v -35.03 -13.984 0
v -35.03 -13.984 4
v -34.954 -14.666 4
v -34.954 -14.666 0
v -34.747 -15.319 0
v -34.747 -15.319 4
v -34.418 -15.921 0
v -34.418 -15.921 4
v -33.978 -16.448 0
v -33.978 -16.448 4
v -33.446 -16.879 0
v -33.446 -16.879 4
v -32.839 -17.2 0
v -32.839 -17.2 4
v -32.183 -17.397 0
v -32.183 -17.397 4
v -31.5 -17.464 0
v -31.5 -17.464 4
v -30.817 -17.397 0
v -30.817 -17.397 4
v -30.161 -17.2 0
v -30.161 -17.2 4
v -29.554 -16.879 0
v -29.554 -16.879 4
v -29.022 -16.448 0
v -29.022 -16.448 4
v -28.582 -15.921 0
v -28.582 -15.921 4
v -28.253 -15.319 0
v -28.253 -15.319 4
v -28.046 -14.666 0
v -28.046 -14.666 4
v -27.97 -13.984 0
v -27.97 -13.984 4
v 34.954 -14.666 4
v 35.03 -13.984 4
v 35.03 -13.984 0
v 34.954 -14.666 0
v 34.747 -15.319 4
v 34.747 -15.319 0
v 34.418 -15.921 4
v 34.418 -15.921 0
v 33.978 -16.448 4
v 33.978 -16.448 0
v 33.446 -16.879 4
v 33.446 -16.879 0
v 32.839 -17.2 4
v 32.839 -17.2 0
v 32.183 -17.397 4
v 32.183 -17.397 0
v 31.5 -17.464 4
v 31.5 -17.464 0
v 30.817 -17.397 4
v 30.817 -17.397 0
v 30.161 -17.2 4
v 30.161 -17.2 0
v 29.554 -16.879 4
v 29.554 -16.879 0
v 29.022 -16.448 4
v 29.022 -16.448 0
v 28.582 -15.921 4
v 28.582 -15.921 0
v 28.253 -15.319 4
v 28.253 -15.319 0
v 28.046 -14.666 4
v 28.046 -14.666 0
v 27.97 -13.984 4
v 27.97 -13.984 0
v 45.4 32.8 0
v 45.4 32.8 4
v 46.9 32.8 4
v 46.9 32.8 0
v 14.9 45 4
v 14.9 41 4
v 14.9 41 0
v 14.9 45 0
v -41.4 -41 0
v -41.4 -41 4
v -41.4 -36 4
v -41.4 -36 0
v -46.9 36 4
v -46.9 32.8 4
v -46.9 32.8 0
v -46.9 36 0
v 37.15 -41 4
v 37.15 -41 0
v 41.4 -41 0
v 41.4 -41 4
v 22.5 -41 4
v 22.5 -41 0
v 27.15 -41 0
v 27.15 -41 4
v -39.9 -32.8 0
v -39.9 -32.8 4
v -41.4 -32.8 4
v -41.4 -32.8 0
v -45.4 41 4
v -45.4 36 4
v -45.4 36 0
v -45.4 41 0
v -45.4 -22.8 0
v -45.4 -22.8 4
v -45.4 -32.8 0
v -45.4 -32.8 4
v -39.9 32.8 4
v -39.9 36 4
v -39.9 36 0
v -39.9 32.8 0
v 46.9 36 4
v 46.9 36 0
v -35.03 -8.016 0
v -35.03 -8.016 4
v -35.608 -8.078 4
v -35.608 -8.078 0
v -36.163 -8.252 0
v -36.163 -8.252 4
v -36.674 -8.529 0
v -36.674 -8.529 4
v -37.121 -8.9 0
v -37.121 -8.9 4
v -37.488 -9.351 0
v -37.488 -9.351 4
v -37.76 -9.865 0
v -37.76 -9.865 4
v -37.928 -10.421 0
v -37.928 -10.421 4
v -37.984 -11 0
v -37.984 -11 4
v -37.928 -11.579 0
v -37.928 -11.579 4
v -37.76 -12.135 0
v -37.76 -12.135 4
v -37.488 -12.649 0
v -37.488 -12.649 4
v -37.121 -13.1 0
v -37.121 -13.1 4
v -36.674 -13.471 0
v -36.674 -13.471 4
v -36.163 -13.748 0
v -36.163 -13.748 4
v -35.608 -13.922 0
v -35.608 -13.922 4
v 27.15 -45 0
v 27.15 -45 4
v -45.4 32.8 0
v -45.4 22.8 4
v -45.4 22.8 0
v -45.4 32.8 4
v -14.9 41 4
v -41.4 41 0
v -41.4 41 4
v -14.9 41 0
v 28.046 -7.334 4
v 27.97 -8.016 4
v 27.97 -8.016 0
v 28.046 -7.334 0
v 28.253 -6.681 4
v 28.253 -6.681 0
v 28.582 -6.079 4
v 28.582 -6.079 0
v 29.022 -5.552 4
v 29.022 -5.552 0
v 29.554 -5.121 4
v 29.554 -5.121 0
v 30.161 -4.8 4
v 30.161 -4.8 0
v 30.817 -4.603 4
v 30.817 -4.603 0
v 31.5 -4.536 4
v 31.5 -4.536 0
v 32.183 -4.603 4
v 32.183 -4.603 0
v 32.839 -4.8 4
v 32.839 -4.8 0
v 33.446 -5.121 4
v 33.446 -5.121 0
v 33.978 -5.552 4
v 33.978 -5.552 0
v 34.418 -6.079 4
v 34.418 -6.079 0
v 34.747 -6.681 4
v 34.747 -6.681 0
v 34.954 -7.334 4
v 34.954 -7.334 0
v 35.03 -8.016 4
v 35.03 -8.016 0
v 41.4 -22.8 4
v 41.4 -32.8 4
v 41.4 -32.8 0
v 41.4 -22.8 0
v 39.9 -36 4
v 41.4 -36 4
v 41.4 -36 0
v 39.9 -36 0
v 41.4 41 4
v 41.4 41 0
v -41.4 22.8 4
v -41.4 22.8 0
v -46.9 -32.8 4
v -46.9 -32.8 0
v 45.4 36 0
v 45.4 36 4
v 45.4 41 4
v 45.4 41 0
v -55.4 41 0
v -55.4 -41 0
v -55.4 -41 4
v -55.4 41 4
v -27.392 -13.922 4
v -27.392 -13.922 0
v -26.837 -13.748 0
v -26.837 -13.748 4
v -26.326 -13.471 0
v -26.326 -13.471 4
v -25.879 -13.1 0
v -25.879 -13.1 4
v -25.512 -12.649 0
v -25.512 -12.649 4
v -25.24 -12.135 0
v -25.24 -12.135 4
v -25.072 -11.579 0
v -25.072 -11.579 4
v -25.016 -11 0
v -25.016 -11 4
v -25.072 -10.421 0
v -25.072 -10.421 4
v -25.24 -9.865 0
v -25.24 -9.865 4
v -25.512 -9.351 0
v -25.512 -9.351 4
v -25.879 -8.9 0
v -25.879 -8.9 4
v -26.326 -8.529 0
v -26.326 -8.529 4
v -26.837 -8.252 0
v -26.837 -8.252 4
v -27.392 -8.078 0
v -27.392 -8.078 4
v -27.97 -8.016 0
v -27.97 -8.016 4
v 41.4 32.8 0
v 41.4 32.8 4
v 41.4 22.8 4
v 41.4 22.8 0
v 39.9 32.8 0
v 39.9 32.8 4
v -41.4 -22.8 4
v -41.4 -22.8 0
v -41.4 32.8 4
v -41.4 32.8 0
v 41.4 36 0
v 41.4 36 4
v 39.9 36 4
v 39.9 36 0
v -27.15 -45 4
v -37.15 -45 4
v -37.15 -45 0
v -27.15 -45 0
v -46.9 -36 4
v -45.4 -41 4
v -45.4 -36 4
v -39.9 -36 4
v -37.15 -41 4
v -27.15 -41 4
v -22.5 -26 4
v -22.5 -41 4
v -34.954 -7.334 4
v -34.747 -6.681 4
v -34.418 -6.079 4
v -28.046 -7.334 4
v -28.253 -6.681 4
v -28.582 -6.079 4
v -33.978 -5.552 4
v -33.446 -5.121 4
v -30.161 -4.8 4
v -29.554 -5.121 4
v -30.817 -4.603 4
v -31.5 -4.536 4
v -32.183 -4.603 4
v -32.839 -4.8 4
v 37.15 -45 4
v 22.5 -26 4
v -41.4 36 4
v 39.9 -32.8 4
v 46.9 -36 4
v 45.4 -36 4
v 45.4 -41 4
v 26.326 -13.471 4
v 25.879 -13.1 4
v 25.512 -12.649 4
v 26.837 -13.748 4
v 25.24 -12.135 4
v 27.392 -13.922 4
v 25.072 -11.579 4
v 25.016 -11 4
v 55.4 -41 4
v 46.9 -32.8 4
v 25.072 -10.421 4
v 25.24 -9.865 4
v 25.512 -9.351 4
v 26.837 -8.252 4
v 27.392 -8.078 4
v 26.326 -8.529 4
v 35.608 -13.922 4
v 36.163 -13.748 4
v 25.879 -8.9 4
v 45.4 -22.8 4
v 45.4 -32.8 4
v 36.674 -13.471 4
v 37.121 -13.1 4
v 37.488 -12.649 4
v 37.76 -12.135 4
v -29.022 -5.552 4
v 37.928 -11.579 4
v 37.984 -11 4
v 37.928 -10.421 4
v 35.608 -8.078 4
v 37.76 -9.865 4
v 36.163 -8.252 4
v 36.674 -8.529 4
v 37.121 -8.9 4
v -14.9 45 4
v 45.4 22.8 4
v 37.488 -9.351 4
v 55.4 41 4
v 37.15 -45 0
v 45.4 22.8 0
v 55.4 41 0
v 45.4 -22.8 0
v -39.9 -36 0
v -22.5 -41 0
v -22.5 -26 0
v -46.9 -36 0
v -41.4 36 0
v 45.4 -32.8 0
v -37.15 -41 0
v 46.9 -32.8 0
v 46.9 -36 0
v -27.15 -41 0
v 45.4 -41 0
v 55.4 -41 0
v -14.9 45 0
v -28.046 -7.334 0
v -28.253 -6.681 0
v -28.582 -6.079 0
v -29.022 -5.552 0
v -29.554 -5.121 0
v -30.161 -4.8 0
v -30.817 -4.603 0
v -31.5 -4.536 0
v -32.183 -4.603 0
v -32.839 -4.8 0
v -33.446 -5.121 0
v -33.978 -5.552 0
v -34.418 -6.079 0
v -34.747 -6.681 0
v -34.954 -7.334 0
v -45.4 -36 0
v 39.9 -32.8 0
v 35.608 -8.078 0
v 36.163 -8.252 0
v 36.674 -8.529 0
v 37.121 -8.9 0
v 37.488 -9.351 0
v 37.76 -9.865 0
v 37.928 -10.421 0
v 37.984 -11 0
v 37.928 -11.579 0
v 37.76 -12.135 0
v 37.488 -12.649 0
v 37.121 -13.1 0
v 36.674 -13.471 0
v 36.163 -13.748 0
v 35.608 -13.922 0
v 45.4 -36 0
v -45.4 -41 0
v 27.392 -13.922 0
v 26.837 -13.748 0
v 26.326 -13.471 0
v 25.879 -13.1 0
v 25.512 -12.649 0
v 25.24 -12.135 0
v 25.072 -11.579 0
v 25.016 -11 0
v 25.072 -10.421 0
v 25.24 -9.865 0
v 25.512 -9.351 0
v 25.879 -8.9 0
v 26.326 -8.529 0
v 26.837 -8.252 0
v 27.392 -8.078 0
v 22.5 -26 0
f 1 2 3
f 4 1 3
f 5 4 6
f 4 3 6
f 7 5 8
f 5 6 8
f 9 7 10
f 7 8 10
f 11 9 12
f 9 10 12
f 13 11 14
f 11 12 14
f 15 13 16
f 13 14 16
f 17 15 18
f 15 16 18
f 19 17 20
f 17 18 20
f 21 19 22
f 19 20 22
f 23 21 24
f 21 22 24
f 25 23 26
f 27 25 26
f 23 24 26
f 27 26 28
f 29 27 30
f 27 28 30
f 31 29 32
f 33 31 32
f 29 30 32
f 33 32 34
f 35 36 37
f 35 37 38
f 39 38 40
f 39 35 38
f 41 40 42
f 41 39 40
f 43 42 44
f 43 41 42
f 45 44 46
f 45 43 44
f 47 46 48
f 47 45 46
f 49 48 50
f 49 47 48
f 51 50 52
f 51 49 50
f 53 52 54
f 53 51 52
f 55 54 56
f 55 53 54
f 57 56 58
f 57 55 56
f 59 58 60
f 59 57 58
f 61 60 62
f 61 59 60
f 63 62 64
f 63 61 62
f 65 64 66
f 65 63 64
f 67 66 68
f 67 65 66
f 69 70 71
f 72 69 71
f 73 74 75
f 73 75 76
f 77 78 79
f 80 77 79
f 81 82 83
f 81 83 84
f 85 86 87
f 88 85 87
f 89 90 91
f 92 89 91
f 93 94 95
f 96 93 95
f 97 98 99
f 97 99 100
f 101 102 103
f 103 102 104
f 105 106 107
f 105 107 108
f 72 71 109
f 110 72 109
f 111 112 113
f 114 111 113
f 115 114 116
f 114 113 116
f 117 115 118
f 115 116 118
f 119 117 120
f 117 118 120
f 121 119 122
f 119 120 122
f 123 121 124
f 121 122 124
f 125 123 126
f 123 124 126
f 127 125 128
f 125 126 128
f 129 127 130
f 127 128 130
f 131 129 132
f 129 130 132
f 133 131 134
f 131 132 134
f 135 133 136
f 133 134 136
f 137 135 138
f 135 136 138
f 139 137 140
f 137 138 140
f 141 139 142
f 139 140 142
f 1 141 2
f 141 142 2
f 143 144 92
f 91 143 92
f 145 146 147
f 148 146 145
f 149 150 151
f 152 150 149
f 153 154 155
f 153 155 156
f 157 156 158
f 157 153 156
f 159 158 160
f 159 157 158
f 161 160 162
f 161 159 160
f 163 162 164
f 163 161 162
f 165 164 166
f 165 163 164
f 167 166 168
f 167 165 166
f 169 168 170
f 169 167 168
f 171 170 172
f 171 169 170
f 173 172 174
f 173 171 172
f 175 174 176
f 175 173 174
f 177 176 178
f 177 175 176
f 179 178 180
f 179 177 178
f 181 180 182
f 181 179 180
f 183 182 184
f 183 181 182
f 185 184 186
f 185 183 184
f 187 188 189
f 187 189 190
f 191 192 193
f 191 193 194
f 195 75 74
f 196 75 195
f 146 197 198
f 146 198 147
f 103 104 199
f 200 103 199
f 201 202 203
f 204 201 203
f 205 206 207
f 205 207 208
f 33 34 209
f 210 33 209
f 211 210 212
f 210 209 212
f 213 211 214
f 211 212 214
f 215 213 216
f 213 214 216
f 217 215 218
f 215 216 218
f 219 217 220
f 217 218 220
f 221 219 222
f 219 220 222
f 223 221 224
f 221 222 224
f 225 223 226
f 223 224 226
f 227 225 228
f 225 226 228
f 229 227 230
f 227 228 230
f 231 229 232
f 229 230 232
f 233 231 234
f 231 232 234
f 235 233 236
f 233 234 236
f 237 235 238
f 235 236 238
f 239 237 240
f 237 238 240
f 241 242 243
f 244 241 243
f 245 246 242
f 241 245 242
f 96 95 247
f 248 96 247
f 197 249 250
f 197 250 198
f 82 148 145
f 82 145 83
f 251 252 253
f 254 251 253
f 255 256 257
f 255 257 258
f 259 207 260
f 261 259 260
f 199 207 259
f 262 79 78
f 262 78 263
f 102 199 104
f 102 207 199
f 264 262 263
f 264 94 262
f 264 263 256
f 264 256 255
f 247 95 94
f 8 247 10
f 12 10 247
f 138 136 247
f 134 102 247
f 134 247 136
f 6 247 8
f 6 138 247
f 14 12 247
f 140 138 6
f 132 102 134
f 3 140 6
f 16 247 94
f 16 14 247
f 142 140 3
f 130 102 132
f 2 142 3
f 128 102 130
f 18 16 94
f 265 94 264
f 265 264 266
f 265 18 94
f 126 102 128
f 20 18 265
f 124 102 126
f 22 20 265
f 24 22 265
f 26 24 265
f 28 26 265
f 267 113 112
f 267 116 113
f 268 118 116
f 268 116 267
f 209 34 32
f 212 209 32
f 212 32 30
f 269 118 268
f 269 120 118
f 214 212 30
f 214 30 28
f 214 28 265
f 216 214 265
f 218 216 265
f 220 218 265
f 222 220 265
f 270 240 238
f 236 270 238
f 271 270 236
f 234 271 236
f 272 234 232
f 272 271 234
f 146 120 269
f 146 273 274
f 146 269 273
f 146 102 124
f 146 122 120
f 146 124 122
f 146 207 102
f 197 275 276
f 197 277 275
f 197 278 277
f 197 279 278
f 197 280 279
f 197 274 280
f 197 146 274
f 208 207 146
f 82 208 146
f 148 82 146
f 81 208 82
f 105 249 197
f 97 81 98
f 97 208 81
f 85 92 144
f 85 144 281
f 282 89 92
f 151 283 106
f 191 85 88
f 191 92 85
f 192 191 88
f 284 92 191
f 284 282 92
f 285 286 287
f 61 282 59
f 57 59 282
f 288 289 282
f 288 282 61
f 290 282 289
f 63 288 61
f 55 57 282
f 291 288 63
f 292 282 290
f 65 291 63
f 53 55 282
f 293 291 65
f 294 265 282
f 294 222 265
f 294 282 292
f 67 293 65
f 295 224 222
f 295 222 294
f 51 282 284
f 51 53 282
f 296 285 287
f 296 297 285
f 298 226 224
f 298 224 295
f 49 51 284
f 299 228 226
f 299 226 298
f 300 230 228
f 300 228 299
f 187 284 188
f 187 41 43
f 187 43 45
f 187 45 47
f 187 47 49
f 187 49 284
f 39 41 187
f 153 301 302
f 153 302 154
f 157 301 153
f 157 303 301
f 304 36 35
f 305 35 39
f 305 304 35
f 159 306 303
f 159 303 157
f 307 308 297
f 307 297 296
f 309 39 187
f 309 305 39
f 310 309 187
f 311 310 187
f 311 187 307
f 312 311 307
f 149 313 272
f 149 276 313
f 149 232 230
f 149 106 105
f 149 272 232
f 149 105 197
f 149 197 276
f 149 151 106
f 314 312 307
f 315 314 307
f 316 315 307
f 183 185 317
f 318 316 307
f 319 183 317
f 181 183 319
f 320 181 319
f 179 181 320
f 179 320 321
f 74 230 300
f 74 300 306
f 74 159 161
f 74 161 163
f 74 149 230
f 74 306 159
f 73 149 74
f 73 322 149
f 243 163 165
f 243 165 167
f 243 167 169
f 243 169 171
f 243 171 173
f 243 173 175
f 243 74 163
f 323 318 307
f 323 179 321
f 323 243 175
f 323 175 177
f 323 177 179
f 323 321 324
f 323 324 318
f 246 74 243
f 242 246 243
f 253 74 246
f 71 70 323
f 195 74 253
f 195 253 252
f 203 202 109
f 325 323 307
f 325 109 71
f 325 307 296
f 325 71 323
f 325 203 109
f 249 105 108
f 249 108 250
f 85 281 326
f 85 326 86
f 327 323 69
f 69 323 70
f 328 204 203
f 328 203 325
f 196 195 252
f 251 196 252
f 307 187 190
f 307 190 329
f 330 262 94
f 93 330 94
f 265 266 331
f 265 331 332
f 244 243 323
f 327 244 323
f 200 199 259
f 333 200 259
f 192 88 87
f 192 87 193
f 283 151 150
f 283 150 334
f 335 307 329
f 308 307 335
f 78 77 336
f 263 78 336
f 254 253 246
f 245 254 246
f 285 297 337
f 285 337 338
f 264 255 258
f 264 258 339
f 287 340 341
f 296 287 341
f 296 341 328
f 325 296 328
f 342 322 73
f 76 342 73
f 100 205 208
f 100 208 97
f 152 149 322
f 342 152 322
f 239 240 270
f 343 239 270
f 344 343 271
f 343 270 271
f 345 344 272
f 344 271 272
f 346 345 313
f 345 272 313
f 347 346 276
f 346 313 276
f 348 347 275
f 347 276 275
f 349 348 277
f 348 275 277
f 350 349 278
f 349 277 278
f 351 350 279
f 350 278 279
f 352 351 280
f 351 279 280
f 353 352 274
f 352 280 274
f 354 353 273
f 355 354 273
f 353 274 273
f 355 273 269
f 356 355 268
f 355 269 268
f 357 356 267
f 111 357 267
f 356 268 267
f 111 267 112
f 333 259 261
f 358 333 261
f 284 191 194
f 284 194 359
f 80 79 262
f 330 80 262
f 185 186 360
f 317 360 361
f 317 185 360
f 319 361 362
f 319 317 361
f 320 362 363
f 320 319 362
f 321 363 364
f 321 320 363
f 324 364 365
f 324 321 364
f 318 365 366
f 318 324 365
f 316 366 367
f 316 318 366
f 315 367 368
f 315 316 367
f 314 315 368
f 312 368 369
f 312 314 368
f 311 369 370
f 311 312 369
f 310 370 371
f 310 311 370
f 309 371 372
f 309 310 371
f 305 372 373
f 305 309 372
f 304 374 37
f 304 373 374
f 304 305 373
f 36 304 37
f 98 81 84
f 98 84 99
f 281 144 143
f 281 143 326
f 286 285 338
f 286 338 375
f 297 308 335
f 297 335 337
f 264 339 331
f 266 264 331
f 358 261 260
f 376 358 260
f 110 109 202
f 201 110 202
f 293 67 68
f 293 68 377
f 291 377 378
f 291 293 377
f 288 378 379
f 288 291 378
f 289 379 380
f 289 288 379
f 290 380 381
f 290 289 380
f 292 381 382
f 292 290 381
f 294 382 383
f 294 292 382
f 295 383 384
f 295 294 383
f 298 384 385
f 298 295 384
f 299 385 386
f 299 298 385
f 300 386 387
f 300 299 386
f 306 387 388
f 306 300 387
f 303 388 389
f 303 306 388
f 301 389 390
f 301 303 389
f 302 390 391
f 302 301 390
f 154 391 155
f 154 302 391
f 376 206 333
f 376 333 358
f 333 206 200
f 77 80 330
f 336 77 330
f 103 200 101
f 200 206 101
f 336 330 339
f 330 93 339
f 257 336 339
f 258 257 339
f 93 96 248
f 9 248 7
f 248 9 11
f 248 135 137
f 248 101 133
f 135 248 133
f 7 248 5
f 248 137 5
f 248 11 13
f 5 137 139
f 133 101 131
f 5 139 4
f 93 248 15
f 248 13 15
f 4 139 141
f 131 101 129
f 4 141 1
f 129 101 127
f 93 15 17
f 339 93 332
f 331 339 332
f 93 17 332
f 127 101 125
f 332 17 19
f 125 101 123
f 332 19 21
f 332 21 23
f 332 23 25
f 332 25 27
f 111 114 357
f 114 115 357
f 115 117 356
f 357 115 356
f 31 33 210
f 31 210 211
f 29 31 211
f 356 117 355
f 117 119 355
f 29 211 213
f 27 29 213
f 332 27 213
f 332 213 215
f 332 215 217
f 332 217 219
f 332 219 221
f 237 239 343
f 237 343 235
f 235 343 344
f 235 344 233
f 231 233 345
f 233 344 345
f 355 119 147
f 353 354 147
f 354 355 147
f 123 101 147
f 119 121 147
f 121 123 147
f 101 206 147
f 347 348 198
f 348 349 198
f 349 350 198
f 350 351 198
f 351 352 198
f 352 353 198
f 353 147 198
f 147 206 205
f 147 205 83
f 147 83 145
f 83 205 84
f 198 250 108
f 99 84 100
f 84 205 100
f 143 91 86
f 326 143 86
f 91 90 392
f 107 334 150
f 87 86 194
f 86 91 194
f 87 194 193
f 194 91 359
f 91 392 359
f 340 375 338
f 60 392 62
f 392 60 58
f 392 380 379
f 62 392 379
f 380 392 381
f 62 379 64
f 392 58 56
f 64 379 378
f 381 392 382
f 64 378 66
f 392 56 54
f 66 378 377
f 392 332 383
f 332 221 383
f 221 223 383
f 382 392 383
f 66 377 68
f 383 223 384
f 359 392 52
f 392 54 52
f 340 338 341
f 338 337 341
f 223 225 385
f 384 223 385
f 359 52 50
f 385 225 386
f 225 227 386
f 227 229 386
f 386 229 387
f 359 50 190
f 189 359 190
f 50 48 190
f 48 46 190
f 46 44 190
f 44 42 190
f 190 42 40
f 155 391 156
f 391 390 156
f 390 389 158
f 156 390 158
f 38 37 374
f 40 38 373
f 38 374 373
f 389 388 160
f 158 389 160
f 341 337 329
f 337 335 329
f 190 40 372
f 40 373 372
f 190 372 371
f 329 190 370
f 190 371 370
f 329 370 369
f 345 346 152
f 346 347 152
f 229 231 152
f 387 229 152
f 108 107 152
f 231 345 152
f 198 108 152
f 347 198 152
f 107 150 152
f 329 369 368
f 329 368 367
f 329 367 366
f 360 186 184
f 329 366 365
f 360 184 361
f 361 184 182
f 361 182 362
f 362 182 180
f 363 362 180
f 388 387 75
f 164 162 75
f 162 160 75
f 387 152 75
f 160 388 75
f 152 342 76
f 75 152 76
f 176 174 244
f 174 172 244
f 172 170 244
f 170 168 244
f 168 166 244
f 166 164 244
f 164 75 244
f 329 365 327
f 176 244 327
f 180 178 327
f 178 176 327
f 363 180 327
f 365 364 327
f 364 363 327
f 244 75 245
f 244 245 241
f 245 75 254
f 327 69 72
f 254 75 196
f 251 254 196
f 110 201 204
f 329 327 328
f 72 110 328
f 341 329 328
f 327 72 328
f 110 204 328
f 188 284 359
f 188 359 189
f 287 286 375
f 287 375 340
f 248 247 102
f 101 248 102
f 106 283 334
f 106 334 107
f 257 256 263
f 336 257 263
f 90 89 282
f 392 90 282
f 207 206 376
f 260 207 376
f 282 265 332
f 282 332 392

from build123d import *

# Parameters (mm, degrees)
SKETCH1_W           = 110.8
SKETCH1_H           = 82
BOSS_EXTRUDE1_DEPTH = 4
CUT_EXTRUDE1_DEPTH  = 10
SKETCH3_W           = 45
SKETCH3_H           = 15
CUT_EXTRUDE2_DEPTH  = 10
CUT_EXTRUDE3_DEPTH  = 10
SKETCH8_W           = 29.8
SKETCH8_H           = 4
BOSS_EXTRUDE2_DEPTH = 4
SKETCH9_W           = 10
SKETCH9_H           = 4
BOSS_EXTRUDE3_DEPTH = 4


with BuildPart() as part:
    # Sketch1 → Boss-Extrude1 (new body)
    with BuildSketch(Plane.XY):
        Rectangle(SKETCH1_W, SKETCH1_H)
    extrude(amount=BOSS_EXTRUDE1_DEPTH)

    # Sketch2 → Cut-Extrude1 (cut)
    with BuildSketch(Plane.XY.offset(4)):
        Polygon((41.4, -32.8), (41.4, -22.8), (45.4, -22.8), (45.4, -32.8), (46.9, -32.8), (46.9, -36), (45.4, -36), (45.4, -41), (41.4, -41), (41.4, -36), (39.9, -36), (39.9, -32.8), align=None)
        Polygon((-41.4, 32.8), (-41.4, 22.8), (-45.4, 22.8), (-45.4, 32.8), (-46.9, 32.8), (-46.9, 36), (-45.4, 36), (-45.4, 41), (-41.4, 41), (-41.4, 36), (-39.9, 36), (-39.9, 32.8), align=None)
        Polygon((45.4, 22.8), (45.4, 32.8), (46.9, 32.8), (46.9, 36), (45.4, 36), (45.4, 41), (41.4, 41), (41.4, 36), (39.9, 36), (39.9, 32.8), (41.4, 32.8), (41.4, 22.8), align=None)
        Polygon((-45.4, -22.8), (-45.4, -32.8), (-46.9, -32.8), (-46.9, -36), (-45.4, -36), (-45.4, -41), (-41.4, -41), (-41.4, -36), (-39.9, -36), (-39.9, -32.8), (-41.4, -32.8), (-41.4, -22.8), align=None)
    extrude(amount=-CUT_EXTRUDE1_DEPTH, mode=Mode.SUBTRACT)

    # Sketch3 → Cut-Extrude2 (cut)
    with BuildSketch(Plane.XY.offset(4)):
        with Locations((0, -33.5)):
            Rectangle(SKETCH3_W, SKETCH3_H)
    extrude(amount=-CUT_EXTRUDE2_DEPTH, mode=Mode.SUBTRACT)

    # Sketch6 → Cut-Extrude3 (cut)
    with BuildSketch(Plane.XY.offset(4)):
        with BuildLine():
            ThreePointArc((-35.03018163, -13.984149147), (-31.5, -17.463580565), (-27.96981837, -13.984149147))
            ThreePointArc((-27.96981837, -13.984149147), (-25.015698228, -11), (-27.96981837, -8.015850853))
            ThreePointArc((-27.96981837, -8.015850853), (-31.5, -4.536419435), (-35.03018163, -8.015850853))
            ThreePointArc((-35.03018163, -8.015850853), (-37.984301772, -11), (-35.03018163, -13.984149147))
        make_face()
        with BuildLine():
            ThreePointArc((27.96981837, -13.984149147), (25.015698228, -11), (27.96981837, -8.015850853))
            ThreePointArc((27.96981837, -8.015850853), (31.5, -4.536419435), (35.03018163, -8.015850853))
            ThreePointArc((35.03018163, -8.015850853), (37.984301772, -11), (35.03018163, -13.984149147))
            ThreePointArc((35.03018163, -13.984149147), (31.5, -17.463580565), (27.96981837, -13.984149147))
        make_face()
    extrude(amount=-CUT_EXTRUDE3_DEPTH, mode=Mode.SUBTRACT)

    # Sketch8 → Boss-Extrude2 (add)
    with BuildSketch(Plane.XY.offset(4)):
        with Locations((0, 43)):
            Rectangle(SKETCH8_W, SKETCH8_H)
    extrude(amount=-BOSS_EXTRUDE2_DEPTH)

    # Sketch9 → Boss-Extrude3 (add)
    with BuildSketch(Plane.XY.offset(4)):
        with Locations((-32.15, -43)):
            Rectangle(SKETCH9_W, SKETCH9_H)
        with Locations((32.15, -43)):
            Rectangle(SKETCH9_W, SKETCH9_H)
    extrude(amount=-BOSS_EXTRUDE3_DEPTH)


solid = part.part
